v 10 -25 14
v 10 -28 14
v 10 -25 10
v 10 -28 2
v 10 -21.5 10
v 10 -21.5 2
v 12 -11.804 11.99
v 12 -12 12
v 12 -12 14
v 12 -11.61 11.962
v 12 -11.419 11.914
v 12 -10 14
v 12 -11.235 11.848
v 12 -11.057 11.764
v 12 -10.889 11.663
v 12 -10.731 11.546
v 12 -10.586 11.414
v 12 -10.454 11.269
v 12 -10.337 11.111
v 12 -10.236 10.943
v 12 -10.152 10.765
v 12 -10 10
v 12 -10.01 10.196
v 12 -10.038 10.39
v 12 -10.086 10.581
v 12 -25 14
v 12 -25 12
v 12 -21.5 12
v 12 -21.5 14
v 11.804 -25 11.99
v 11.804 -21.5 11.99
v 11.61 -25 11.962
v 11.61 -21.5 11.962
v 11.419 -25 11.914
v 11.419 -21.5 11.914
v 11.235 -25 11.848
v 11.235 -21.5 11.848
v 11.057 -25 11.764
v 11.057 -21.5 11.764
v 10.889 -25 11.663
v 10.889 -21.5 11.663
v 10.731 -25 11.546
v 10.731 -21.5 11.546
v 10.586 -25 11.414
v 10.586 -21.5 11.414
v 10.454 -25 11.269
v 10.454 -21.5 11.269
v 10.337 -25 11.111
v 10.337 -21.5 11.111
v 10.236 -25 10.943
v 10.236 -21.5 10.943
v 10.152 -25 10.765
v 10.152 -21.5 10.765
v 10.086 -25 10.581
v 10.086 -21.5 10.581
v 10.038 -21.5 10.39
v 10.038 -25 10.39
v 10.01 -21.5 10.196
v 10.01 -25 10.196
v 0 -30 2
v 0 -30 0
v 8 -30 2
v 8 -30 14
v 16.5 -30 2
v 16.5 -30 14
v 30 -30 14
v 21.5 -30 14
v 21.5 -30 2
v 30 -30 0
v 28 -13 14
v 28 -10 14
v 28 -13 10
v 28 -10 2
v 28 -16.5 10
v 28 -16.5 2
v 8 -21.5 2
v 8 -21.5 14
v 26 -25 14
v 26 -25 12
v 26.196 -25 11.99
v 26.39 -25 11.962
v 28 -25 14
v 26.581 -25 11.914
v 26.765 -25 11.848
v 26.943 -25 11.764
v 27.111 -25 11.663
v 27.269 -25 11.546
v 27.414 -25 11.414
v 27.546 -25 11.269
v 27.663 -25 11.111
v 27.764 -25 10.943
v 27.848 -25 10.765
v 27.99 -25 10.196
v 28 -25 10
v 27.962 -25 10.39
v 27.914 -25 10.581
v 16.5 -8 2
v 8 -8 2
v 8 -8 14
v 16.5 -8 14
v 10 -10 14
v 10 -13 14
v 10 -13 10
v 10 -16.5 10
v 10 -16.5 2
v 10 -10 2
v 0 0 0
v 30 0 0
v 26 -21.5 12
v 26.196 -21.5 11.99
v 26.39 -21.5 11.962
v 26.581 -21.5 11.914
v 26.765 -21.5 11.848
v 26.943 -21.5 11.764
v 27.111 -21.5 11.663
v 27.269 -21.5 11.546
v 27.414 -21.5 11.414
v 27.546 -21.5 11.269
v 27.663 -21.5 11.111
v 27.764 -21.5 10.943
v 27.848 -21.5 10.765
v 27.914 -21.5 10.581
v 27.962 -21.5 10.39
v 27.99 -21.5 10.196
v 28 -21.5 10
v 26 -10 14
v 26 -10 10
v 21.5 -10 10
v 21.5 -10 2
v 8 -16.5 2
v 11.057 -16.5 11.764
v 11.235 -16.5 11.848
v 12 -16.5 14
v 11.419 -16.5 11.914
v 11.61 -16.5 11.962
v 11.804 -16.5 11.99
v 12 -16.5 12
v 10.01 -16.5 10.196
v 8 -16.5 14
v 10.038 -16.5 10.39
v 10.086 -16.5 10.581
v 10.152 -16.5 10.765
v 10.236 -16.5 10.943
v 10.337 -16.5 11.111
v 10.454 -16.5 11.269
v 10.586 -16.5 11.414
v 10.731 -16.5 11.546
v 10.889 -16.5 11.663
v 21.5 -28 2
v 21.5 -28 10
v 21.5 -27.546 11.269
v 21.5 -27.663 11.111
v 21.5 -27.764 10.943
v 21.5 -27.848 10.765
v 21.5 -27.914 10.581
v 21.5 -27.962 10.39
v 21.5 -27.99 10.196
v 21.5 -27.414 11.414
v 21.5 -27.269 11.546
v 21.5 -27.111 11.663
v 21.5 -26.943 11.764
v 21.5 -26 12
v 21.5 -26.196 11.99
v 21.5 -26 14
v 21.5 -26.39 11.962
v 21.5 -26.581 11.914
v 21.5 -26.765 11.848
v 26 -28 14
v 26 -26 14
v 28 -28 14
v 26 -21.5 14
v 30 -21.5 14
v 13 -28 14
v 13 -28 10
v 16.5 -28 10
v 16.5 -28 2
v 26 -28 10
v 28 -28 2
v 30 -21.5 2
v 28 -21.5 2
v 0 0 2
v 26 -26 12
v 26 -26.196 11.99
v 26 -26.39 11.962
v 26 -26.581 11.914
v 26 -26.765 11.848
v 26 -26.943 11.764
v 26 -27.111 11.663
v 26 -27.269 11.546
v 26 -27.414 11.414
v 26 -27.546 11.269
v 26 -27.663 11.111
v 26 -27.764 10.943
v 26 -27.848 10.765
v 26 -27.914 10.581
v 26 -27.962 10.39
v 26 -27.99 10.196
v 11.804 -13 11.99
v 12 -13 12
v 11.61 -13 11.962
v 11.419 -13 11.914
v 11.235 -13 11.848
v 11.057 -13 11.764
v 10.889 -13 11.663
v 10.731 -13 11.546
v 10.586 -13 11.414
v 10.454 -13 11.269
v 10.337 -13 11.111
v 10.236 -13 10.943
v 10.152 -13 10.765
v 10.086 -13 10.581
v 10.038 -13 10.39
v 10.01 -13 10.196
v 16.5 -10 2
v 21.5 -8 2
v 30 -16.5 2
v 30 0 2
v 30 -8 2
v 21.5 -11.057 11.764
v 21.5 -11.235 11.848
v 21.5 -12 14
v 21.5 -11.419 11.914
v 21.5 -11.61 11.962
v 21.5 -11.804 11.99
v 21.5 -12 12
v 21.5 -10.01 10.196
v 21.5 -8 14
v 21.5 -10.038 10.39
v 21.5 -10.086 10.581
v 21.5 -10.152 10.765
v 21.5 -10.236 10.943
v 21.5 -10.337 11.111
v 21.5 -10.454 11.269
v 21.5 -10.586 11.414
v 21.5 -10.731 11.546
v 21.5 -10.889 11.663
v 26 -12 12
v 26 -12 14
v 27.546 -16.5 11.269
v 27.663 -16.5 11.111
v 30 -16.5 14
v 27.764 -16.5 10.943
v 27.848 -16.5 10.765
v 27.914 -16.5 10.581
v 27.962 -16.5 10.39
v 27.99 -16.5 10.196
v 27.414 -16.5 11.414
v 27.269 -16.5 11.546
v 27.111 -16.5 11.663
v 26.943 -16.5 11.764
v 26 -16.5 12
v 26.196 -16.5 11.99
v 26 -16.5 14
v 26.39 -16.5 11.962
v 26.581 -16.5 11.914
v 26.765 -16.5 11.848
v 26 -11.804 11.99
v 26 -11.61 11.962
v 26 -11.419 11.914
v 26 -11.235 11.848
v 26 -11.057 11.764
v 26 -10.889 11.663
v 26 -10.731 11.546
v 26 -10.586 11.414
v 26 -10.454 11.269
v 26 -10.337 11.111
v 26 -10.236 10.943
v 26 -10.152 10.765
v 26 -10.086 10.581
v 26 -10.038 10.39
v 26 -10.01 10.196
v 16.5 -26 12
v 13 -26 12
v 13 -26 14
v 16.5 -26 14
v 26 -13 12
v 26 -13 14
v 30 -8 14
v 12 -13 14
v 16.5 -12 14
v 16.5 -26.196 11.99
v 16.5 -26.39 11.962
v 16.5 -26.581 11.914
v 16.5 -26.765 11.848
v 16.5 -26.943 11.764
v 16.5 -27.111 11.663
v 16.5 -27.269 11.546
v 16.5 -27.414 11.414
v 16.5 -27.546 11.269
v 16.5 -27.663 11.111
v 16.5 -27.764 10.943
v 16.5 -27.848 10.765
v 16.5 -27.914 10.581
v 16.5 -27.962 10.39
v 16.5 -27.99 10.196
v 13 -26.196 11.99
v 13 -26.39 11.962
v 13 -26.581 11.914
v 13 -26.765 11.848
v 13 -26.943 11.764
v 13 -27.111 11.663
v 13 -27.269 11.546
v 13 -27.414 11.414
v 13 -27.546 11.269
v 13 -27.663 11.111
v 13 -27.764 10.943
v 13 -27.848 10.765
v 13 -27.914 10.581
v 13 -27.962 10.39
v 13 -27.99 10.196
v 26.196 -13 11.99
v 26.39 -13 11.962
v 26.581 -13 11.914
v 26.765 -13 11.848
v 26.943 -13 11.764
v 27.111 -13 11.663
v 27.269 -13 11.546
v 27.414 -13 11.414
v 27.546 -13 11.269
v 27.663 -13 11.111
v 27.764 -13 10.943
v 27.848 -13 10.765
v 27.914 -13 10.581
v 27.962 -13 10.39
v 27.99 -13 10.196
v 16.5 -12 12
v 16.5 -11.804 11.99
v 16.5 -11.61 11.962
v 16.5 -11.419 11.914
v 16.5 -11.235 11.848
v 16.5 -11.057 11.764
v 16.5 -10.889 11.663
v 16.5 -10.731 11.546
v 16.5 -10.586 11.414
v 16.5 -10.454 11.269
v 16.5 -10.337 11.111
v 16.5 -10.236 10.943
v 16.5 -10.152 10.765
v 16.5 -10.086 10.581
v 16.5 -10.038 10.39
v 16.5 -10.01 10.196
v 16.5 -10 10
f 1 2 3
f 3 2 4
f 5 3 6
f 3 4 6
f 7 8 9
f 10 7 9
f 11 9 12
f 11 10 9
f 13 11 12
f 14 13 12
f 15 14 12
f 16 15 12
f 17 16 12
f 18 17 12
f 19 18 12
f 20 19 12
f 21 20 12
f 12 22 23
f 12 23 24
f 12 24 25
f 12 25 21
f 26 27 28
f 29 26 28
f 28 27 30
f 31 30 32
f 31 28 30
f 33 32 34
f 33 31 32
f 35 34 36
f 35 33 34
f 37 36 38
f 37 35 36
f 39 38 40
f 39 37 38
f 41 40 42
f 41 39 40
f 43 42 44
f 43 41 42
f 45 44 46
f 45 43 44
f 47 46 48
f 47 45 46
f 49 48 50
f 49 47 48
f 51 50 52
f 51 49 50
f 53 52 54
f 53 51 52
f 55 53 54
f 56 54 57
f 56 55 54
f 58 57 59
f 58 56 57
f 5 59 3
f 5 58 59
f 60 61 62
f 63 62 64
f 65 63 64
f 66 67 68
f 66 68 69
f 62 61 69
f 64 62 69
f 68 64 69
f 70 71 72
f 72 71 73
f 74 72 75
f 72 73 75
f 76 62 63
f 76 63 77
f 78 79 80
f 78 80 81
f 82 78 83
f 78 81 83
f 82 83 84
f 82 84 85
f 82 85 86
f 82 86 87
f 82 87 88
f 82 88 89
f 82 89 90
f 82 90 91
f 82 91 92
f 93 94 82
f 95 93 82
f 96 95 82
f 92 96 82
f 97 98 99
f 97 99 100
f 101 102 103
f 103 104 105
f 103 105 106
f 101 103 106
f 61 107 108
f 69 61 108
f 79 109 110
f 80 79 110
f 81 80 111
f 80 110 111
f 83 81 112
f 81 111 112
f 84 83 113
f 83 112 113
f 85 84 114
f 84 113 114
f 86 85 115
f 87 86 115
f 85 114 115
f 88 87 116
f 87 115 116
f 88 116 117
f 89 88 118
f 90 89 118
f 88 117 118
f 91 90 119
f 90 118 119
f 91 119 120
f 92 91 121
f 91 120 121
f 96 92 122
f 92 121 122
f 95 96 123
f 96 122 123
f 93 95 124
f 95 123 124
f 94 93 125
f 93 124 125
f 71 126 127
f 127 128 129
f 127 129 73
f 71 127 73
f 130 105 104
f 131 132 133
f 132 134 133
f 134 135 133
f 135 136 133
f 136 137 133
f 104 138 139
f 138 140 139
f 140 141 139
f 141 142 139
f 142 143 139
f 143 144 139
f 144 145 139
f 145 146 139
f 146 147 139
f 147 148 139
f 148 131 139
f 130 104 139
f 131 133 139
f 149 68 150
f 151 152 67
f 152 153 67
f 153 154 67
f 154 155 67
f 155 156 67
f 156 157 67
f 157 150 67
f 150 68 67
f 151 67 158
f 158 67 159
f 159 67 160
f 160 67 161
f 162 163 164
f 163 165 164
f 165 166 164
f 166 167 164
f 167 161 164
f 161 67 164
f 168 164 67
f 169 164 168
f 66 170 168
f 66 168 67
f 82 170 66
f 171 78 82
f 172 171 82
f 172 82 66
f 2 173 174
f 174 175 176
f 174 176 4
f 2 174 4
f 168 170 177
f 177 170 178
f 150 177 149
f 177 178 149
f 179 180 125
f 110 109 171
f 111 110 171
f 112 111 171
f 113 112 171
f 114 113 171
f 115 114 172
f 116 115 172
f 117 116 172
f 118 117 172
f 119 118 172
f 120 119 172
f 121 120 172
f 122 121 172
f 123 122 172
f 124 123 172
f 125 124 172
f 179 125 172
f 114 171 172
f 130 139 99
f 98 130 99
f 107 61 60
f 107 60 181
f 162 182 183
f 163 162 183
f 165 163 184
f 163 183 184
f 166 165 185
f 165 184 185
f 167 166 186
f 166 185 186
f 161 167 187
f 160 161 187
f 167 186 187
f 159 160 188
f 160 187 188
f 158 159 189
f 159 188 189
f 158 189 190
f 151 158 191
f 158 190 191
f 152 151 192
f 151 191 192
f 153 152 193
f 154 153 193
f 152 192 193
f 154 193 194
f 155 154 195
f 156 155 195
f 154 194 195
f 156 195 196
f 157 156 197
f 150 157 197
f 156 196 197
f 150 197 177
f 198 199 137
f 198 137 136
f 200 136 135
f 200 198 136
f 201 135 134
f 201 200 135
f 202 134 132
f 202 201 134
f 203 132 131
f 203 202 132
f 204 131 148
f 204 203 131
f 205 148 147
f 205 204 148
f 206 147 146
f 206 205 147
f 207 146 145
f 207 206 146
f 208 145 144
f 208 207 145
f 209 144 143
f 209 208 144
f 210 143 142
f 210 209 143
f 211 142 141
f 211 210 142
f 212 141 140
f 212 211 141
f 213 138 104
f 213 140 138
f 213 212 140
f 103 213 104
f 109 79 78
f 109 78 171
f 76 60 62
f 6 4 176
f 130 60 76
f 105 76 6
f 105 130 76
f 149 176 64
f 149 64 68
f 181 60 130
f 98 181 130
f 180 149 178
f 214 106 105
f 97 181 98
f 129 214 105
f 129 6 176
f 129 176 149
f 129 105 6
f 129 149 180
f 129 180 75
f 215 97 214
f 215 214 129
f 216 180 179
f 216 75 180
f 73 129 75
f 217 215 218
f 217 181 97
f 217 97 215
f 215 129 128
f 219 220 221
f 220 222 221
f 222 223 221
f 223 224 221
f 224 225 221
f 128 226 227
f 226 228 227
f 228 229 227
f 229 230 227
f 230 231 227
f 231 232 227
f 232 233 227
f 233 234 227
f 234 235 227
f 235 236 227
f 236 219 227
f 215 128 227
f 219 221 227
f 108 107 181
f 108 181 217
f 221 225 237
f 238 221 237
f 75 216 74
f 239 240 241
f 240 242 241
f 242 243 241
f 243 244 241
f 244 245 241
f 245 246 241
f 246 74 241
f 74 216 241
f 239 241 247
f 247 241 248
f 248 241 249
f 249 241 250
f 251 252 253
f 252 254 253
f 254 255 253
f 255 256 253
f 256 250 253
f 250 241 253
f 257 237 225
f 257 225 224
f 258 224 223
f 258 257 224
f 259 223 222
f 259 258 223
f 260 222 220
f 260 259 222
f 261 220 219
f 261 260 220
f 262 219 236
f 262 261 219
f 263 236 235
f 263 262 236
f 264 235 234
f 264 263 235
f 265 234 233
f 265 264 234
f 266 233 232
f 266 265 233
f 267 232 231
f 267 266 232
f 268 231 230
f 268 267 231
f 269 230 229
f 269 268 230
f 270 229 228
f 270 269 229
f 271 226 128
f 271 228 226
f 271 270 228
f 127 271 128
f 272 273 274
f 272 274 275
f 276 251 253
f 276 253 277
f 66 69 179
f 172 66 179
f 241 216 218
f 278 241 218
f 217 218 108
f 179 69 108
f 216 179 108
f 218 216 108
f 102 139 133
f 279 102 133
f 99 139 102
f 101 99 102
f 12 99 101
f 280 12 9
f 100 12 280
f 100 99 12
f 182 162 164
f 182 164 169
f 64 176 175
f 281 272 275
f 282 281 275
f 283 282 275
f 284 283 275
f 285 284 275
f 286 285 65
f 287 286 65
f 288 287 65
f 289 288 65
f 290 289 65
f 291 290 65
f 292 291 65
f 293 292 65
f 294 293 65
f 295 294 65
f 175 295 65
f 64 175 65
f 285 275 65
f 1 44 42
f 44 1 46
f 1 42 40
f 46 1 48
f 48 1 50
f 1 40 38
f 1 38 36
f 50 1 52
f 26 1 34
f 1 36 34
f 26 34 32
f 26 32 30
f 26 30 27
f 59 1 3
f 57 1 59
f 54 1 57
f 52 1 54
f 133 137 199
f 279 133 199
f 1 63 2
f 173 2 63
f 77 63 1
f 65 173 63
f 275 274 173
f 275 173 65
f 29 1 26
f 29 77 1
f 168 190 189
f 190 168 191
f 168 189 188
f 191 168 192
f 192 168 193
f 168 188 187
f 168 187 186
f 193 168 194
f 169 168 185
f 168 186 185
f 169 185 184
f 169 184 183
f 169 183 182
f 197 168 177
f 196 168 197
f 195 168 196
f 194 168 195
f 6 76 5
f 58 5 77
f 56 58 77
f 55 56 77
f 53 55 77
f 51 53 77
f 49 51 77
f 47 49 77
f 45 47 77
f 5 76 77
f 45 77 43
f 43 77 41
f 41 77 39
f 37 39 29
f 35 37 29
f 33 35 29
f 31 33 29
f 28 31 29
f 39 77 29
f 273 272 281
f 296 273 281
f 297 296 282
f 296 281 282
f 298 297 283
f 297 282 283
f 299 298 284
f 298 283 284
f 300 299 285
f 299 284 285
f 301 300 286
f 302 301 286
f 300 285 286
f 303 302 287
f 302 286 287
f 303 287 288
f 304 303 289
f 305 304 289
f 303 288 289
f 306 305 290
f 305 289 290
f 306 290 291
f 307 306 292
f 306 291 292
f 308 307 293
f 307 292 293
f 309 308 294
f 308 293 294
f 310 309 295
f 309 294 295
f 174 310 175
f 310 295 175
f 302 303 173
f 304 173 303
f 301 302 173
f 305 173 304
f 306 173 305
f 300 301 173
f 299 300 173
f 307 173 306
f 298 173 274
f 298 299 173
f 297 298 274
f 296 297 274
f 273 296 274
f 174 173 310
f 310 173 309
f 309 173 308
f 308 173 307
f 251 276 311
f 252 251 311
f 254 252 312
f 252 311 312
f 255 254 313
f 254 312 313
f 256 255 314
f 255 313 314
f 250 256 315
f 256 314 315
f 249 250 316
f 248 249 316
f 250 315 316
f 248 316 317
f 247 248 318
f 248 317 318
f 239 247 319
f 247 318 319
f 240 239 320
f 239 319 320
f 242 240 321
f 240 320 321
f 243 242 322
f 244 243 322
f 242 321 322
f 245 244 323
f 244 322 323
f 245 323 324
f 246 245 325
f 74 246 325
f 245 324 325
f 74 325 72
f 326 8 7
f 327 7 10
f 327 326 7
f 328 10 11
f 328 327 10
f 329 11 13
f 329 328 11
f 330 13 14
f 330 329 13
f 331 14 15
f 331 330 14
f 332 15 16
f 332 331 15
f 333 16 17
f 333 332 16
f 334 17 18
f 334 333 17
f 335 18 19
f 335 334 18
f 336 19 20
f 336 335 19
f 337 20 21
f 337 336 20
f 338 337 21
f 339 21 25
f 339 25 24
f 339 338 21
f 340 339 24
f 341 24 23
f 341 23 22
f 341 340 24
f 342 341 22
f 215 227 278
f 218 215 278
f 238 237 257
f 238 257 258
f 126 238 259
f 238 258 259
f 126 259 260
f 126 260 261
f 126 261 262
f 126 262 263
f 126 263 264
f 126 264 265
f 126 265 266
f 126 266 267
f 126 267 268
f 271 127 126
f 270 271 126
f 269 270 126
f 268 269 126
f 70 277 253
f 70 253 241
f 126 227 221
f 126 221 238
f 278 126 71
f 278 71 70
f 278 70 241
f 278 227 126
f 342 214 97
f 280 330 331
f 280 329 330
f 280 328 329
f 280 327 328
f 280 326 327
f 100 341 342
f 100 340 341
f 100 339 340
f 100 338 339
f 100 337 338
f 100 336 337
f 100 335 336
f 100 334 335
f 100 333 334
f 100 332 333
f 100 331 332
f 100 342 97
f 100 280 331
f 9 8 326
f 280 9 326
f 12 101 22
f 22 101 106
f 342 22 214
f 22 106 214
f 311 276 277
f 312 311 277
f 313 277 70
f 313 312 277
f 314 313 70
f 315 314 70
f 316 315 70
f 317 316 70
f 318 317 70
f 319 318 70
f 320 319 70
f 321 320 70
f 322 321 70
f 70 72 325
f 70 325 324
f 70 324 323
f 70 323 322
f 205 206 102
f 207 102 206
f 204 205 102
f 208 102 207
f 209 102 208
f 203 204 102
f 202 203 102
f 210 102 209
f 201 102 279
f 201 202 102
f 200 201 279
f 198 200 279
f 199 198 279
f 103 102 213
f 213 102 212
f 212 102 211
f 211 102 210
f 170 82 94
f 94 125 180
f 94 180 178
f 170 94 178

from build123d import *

# Parameters (mm, degrees)
F0_W     = 30
F0_H     = 30
F1_DEPTH = 2
F2_W     = 22
F2_H     = 22
F2_W_2   = 18
F2_H_2   = 18
F3_DEPTH = 10
F4_W     = 22
F4_H     = 22
F4_W_2   = 2
F4_H_2   = 12
F4_W_3   = 14
F4_H_3   = 2
F4_W_4   = 13
F5_DEPTH = 2
F6_R     = 1.99999
F7_W     = 12.5
F7_H     = 5
F7_W_2   = 5
F7_H_2   = 12.5
F8_DEPTH = 12


# Not quite as in the source:
# - a fillet or chamfer is up to 0.001 mm smaller than in the source, because OpenCascade refuses the exact size


with BuildPart() as f1:
    # F0 (on Top) → F1 (new body)
    with BuildSketch(Plane.XY):
        with Locations((15, -15)):
            Rectangle(F0_W, F0_H)
    extrude(amount=F1_DEPTH)

    # F2 (on face) → F3 (join)
    with BuildSketch(Plane.XY.offset(2)):
        with Locations((19, -19)):
            Rectangle(F2_W, F2_H)
        with Locations((19, -19)):
            Rectangle(F2_W_2, F2_H_2, mode=Mode.SUBTRACT)
    extrude(amount=F3_DEPTH)

    # F4 (on face) → F5 (join)
    with BuildSketch(Plane.XY.offset(12)):
        with Locations((19, -19)):
            Rectangle(F4_W, F4_H)
        Polygon((13, -28), (10, -28), (10, -25), (10, -13), (10, -10), (12, -10), (26, -10), (28, -10), (28, -13), (28, -25), (28, -28), (26, -28), align=None, mode=Mode.SUBTRACT)
        with Locations((11, -19)):
            Rectangle(F4_W_2, F4_H_2)
        with Locations((19, -11)):
            Rectangle(F4_W_3, F4_H_3)
        with Locations((27, -19)):
            Rectangle(F4_W_2, F4_H_2)
        with Locations((19.5, -27)):
            Rectangle(F4_W_4, F4_H_3)
    extrude(amount=F5_DEPTH)

    # F6 (radius 2 in the source; OpenCascade refuses exactly that, so slightly less here)
    f6_edges = [f1.edges().sort_by_distance(p)[0] for p in [
        (10, -19, 12),
        (28, -19, 12),
        (19, -10, 12),
        (19.5, -28, 12),
    ]]
    fillet(f6_edges, radius=F6_R)

    # F7 (on face) → F8 (cut, through all)
    with BuildSketch(Plane.XY.offset(14)):
        with Locations((27.75, -19)):
            Rectangle(F7_W, F7_H)
        with Locations((19, -27.75)):
            Rectangle(F7_W_2, F7_H_2)
        with Locations((19, -19)):
            Rectangle(F7_W_2, F7_H)
        with Locations((10.25, -19)):
            Rectangle(F7_W, F7_H)
        with Locations((19, -10.25)):
            Rectangle(F7_W_2, F7_H_2)
    extrude(amount=-F8_DEPTH, mode=Mode.SUBTRACT)


solid = f1.part
